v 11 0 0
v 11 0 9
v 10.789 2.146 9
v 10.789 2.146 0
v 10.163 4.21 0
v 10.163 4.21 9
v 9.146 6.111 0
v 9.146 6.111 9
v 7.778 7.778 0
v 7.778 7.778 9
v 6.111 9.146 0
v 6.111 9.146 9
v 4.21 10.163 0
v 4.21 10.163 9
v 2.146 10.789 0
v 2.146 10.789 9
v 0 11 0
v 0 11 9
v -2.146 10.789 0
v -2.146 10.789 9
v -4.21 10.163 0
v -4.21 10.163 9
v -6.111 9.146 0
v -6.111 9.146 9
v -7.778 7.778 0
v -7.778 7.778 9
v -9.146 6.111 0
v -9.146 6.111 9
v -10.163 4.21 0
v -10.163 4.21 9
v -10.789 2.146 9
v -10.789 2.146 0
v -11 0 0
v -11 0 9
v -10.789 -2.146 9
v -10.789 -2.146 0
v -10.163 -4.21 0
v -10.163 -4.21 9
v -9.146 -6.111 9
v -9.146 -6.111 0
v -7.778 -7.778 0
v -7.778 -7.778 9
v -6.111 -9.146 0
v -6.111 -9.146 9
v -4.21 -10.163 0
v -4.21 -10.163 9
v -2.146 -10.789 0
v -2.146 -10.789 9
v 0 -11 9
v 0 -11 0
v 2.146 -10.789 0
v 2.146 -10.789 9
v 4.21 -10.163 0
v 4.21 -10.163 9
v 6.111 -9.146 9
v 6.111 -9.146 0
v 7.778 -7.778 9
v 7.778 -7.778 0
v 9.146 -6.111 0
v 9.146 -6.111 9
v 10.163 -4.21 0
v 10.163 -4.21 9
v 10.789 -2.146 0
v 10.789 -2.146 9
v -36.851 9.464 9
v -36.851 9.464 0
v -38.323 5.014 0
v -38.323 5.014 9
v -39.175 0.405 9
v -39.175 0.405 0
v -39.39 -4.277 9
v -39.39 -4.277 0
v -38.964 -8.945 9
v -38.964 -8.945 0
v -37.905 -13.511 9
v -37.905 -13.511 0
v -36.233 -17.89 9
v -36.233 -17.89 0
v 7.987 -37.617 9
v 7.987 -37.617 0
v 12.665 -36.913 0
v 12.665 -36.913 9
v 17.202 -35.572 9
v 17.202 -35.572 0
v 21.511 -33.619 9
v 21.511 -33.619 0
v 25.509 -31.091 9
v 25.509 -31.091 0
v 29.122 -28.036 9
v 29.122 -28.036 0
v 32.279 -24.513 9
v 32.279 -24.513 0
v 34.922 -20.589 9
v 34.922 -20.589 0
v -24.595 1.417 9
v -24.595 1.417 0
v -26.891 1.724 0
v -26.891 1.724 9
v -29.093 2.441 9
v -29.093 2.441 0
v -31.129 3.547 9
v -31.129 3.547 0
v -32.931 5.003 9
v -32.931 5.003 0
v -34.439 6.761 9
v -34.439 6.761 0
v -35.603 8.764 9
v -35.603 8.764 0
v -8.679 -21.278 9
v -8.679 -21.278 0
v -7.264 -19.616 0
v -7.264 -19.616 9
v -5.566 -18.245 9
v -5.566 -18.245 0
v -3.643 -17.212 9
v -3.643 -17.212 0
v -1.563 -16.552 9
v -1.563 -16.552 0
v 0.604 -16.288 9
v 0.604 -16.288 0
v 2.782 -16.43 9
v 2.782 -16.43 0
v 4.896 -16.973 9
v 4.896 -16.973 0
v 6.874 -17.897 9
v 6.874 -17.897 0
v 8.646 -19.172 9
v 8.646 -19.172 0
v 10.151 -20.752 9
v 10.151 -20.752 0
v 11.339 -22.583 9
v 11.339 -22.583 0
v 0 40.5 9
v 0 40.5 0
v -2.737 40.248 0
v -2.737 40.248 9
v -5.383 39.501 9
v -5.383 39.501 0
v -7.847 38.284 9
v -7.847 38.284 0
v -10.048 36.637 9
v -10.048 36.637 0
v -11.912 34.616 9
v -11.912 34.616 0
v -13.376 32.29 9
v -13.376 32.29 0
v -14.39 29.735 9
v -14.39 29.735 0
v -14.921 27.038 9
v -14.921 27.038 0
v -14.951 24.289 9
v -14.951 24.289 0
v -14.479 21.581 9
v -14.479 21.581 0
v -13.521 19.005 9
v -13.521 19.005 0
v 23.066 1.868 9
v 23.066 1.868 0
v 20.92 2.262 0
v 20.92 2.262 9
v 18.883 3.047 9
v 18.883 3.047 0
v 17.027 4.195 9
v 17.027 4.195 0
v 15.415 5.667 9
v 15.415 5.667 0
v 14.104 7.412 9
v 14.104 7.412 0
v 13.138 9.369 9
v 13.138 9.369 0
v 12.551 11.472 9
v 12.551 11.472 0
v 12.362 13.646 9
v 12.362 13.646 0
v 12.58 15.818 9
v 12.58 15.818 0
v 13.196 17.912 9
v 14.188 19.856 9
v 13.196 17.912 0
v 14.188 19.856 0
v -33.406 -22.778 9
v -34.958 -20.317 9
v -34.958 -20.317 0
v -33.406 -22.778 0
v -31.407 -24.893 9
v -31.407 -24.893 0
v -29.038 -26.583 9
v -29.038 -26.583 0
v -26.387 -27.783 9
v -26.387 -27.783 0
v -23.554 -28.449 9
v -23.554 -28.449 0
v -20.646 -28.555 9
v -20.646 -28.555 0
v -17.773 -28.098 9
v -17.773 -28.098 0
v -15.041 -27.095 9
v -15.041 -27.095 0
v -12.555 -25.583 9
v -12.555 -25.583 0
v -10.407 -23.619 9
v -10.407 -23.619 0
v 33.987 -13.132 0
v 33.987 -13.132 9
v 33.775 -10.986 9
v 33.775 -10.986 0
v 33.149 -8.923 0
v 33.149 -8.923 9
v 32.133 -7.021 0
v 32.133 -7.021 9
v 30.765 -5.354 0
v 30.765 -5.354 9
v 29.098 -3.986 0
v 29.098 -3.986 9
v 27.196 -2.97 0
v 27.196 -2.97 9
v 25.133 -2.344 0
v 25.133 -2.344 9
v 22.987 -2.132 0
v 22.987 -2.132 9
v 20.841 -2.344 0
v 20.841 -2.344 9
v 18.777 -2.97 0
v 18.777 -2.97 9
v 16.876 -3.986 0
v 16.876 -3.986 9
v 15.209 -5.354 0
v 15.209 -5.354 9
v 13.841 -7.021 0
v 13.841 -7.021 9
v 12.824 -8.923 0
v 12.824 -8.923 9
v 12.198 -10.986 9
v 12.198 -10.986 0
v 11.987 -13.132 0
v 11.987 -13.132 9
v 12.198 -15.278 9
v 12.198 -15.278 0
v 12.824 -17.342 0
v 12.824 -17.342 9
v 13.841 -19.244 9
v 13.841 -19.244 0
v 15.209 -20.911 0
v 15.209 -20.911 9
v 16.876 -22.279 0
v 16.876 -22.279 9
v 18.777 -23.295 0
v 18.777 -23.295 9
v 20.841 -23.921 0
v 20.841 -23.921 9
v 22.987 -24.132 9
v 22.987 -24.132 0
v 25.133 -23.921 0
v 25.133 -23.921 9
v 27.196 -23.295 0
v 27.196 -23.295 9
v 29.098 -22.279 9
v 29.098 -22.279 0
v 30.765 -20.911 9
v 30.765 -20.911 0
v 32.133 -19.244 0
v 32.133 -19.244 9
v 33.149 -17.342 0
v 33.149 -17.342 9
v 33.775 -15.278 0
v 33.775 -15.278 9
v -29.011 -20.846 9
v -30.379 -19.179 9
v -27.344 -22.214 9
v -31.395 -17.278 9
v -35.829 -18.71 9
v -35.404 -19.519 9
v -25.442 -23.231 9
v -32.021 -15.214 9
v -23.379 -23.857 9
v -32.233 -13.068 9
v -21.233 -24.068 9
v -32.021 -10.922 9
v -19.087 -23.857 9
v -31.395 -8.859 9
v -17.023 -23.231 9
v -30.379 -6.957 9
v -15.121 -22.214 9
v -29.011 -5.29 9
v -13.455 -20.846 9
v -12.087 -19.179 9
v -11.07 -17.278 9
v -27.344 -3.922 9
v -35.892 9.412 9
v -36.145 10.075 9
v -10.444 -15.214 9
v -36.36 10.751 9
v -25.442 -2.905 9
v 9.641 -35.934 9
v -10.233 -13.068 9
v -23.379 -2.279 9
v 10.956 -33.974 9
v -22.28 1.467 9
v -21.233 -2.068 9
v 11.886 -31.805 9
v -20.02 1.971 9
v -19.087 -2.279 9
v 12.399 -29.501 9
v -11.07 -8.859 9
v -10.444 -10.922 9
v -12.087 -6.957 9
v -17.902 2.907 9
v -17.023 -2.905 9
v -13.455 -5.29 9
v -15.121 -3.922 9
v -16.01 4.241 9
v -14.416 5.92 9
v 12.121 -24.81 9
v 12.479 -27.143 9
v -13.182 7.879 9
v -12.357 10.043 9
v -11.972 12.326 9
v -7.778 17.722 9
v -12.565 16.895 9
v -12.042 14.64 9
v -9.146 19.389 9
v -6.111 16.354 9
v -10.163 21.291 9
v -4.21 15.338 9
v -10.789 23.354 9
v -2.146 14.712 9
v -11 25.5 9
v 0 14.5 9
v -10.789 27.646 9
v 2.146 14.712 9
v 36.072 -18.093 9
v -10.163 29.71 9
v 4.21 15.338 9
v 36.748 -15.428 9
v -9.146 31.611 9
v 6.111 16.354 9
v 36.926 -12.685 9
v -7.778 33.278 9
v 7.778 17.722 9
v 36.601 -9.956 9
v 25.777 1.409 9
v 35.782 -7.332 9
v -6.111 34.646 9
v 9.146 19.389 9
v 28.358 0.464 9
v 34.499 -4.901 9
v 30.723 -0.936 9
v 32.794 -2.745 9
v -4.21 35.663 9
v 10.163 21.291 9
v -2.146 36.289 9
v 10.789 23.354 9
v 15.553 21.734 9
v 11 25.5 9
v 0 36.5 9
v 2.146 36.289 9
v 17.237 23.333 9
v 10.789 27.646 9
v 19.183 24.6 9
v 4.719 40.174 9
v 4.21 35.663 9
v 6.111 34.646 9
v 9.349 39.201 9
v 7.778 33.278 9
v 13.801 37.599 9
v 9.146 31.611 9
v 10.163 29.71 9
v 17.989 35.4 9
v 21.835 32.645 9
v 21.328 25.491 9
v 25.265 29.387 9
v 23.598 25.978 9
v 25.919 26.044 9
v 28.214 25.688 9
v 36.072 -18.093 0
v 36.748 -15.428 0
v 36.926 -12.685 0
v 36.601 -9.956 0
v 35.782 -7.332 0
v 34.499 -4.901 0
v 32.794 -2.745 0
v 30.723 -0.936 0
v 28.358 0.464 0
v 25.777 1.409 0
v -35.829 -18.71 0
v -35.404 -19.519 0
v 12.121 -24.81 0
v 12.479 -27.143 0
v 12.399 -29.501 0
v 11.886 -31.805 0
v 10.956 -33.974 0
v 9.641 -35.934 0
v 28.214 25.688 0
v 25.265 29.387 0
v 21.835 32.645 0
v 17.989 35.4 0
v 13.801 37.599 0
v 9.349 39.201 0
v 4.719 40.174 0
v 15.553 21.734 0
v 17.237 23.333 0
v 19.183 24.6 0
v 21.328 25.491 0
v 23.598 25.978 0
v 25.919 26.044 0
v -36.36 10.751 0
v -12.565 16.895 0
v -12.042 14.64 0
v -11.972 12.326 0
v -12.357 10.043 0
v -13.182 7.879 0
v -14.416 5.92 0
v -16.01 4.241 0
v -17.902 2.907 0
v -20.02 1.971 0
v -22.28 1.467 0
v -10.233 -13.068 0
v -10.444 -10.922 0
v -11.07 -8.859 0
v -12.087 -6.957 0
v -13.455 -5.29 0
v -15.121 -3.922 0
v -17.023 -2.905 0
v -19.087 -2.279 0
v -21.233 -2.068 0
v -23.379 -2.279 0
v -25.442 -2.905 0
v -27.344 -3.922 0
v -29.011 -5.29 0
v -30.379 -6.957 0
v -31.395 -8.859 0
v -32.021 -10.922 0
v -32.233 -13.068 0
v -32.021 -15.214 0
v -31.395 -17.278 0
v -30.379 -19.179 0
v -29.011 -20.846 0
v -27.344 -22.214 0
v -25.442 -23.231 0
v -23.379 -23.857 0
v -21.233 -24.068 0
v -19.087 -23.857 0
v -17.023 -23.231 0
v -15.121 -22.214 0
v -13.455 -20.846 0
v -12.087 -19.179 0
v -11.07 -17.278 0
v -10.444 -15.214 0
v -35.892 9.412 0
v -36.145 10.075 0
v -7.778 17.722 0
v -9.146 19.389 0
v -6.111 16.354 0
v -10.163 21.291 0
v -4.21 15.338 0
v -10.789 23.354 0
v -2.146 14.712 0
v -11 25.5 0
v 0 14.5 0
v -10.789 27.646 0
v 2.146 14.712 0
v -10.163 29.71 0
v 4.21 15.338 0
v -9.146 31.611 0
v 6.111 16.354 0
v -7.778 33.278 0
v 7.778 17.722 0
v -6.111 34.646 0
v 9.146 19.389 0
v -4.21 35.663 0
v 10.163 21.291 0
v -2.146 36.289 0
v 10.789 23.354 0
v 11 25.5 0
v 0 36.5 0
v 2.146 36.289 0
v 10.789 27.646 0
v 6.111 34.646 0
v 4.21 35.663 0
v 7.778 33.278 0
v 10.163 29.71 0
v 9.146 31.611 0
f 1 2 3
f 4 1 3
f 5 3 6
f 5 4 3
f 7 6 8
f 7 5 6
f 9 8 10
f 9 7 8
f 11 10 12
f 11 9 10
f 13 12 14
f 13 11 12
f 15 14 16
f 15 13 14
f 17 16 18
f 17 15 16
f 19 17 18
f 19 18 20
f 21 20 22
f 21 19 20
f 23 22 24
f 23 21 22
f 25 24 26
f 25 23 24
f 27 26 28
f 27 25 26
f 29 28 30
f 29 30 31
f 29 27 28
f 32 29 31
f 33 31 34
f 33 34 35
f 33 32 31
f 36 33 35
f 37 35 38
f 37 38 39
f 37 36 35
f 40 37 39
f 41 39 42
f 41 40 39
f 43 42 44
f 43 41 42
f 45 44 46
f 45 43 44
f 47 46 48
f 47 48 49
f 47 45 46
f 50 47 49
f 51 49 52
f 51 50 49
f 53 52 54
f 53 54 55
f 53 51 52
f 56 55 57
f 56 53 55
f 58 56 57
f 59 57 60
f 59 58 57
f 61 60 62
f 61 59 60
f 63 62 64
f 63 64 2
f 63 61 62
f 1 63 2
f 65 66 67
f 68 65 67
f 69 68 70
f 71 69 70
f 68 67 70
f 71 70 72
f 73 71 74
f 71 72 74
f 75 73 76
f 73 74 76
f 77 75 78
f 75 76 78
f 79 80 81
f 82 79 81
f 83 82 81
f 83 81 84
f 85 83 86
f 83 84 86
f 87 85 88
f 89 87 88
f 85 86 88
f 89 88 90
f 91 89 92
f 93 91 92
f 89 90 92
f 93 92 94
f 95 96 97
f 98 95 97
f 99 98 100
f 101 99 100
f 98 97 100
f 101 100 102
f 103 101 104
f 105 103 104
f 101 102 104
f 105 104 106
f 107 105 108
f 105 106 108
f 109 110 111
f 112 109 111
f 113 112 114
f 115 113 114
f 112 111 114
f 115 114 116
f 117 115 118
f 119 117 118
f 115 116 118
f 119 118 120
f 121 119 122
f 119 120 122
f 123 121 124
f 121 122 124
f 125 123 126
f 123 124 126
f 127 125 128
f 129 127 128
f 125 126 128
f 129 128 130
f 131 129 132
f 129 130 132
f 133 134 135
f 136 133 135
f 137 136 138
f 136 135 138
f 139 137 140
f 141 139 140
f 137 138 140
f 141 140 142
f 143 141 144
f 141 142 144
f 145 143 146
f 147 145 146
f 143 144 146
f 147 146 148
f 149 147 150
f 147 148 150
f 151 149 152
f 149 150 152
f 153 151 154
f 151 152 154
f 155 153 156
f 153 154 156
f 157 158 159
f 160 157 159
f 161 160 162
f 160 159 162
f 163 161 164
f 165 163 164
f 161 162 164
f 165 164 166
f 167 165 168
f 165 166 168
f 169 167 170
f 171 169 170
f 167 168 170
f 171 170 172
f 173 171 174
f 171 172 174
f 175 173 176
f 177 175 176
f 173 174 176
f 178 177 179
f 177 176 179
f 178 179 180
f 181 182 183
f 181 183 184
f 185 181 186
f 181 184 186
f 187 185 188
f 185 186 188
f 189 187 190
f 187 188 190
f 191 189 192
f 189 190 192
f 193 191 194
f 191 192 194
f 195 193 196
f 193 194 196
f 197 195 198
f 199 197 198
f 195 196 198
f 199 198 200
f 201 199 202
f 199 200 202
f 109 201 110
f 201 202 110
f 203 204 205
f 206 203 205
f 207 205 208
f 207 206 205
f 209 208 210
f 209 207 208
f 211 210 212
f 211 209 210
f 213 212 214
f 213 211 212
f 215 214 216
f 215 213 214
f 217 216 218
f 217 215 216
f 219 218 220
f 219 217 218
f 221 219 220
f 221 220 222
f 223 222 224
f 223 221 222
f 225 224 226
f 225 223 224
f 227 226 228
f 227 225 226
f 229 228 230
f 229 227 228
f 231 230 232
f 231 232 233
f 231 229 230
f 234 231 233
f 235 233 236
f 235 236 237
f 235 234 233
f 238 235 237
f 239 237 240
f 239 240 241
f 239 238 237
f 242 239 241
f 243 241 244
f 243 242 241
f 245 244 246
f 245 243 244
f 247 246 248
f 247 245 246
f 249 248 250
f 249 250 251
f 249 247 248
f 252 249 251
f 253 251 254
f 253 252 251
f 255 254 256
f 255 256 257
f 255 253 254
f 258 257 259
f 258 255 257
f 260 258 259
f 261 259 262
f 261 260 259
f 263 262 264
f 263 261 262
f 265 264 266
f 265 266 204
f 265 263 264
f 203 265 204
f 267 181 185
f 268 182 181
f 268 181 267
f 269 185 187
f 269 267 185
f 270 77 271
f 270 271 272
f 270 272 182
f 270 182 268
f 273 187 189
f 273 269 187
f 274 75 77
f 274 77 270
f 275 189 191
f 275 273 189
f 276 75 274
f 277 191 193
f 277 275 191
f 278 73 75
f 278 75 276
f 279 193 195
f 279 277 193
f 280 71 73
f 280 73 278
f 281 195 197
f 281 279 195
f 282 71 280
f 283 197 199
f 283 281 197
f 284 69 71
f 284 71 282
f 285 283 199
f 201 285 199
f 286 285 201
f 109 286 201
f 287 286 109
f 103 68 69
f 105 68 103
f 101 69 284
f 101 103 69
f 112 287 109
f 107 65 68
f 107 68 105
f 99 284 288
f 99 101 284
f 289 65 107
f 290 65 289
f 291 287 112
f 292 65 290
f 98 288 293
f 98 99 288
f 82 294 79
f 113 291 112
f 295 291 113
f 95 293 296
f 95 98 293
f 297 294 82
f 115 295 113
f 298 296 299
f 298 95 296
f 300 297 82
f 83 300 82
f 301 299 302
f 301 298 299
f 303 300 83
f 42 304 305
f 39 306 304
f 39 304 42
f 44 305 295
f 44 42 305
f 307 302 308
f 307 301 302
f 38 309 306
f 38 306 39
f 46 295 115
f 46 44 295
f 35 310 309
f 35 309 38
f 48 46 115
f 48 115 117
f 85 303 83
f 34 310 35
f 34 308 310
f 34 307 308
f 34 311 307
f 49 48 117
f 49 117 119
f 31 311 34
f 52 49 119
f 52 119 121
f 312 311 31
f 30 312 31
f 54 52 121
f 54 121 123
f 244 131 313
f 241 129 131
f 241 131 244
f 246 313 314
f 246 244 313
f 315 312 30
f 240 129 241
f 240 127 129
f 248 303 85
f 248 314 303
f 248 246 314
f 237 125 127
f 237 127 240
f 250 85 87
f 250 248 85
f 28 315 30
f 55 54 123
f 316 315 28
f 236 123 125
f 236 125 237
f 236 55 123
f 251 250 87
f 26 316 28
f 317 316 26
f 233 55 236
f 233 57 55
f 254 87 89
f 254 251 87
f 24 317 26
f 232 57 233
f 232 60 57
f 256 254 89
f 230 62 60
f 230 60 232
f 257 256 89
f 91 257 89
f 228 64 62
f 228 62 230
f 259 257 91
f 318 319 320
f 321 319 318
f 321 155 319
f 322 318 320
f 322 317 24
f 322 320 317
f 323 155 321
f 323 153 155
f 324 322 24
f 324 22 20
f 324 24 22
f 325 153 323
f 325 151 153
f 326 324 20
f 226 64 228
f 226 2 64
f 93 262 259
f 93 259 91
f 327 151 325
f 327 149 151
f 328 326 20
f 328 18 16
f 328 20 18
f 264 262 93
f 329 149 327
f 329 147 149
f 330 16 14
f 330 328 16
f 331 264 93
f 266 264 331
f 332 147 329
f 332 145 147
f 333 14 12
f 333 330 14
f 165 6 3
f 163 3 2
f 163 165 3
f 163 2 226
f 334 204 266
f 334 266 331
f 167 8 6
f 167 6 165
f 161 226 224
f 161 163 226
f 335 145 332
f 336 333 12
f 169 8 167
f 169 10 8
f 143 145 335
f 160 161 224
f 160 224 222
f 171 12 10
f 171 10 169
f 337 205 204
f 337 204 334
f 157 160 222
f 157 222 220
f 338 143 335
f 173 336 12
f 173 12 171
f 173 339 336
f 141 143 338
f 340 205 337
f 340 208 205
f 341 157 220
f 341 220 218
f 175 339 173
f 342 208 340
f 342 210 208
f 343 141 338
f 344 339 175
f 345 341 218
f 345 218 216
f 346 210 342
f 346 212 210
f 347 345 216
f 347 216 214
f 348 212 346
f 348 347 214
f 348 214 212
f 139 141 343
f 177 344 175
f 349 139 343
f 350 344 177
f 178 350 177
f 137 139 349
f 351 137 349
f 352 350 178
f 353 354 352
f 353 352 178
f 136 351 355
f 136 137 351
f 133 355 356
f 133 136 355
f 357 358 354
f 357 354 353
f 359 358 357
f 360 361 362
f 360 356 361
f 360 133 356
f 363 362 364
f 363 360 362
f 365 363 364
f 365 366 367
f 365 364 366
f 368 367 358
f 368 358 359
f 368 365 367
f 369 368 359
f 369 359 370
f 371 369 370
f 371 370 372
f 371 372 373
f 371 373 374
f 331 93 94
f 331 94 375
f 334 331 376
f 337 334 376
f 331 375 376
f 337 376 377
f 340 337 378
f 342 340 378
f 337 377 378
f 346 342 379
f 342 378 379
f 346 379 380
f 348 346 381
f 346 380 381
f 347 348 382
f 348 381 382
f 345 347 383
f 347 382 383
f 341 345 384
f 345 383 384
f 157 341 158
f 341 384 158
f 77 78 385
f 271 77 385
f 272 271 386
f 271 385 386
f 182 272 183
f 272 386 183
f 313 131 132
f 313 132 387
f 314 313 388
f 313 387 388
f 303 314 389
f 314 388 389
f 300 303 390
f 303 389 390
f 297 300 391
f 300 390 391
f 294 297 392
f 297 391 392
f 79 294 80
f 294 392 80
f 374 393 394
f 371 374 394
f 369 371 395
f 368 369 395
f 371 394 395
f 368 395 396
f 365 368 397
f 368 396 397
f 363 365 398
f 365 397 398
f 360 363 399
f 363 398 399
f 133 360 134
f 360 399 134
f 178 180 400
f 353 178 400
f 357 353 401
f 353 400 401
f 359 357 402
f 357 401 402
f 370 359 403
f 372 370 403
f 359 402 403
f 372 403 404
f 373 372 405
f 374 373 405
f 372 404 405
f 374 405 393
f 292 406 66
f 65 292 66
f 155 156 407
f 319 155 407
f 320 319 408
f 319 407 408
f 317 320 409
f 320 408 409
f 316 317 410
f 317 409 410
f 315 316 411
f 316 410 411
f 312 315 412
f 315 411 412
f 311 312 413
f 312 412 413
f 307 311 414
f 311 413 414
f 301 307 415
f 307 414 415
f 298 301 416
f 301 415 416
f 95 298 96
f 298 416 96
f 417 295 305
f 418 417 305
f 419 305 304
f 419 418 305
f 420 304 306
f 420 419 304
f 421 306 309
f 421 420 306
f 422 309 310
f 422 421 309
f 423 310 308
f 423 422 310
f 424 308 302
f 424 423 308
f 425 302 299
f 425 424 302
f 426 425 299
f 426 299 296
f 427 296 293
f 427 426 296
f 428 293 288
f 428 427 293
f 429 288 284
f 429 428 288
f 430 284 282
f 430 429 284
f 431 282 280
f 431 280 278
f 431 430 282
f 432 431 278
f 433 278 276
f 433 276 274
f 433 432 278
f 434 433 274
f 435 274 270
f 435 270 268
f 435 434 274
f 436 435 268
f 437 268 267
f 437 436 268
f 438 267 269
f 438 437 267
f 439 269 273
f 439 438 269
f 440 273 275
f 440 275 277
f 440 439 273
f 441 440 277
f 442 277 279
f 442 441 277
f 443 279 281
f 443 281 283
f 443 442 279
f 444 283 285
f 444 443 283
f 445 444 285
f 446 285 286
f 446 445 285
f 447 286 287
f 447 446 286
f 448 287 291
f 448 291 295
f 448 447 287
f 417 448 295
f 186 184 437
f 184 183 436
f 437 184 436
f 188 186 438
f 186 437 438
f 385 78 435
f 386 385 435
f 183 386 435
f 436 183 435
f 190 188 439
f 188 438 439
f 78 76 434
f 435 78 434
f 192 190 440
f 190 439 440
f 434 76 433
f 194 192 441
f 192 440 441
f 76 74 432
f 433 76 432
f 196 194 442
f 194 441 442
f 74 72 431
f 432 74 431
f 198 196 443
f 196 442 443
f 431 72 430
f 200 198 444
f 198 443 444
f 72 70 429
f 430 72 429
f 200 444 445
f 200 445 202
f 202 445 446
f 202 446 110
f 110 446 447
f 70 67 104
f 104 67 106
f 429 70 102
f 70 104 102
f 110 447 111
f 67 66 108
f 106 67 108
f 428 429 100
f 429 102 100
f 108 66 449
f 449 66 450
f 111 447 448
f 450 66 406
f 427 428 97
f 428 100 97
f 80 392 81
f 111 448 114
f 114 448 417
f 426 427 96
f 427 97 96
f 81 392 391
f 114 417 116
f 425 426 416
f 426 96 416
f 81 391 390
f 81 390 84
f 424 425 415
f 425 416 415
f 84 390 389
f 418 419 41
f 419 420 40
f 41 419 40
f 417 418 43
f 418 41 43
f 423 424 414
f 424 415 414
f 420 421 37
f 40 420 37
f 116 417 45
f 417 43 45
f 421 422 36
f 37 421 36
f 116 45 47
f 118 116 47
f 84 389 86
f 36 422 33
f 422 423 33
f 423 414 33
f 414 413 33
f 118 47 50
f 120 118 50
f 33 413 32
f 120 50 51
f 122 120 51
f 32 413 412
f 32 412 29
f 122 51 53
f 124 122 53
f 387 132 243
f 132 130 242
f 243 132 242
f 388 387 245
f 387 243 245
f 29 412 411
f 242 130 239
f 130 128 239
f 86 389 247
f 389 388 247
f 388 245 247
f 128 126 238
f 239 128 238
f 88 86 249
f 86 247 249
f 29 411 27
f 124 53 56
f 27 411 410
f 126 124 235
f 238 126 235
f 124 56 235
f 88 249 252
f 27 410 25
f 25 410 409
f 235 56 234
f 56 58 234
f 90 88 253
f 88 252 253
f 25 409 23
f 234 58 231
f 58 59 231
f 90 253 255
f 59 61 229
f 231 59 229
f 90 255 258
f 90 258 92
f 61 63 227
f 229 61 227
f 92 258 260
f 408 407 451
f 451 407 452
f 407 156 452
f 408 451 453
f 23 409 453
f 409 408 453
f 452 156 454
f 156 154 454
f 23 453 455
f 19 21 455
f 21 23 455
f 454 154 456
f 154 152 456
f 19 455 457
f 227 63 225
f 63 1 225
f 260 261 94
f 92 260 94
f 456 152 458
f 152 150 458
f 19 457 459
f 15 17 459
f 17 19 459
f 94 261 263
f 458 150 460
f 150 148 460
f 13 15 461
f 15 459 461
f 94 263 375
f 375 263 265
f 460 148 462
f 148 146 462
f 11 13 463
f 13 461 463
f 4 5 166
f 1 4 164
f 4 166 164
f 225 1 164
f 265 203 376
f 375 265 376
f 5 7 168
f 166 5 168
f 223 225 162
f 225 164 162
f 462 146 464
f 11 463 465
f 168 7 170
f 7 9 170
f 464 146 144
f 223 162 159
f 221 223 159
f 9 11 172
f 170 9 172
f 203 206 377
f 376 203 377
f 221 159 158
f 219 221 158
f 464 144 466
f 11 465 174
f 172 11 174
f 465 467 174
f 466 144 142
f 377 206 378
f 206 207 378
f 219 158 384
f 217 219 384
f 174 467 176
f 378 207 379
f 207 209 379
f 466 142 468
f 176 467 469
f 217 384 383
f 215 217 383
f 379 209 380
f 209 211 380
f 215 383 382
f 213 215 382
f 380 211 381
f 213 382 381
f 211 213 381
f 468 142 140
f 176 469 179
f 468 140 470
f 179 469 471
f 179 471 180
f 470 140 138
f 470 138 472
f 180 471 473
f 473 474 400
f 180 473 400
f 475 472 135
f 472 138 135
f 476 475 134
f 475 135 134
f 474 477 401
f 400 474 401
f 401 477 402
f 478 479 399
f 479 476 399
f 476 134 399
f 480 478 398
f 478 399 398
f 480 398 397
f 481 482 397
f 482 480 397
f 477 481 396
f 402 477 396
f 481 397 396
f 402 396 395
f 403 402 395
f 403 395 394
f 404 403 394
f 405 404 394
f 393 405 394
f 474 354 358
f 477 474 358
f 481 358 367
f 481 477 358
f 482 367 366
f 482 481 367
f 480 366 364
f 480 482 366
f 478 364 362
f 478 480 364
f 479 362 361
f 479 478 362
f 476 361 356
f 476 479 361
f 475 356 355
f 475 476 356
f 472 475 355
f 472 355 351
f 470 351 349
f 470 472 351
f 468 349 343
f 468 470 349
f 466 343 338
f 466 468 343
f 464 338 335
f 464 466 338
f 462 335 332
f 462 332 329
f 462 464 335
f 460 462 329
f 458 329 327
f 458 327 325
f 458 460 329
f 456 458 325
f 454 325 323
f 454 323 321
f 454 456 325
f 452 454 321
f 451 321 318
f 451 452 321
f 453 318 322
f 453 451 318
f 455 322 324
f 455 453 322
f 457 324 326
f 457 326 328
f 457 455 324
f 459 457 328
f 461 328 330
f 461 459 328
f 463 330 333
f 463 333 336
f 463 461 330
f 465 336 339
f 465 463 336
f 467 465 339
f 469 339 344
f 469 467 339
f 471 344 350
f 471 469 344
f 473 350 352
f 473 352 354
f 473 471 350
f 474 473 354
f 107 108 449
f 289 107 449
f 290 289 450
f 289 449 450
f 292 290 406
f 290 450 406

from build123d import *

# Parameters (mm, degrees)
F0_R     = 11
F1_DEPTH = 9


with BuildPart() as f1:
    # F0 (on Top) → F1 (new body)
    with BuildSketch(Plane.XY):
        with BuildLine():
            ThreePointArc((-36.851079, 9.464021), (-39.389584, -4.277113), (-36.232757, -17.889505))
            ThreePointArc((-36.232757, -17.889505), (-35.619676, -19.115828), (-34.958043, -20.316652))
            ThreePointArc((-34.958043, -20.316652), (-22.102923, -28.572601), (-8.67895, -21.277965))
            ThreePointArc((-8.67895, -21.277965), (1.696424, -16.308632), (11.338573, -22.583312))
            ThreePointArc((11.338573, -22.583312), (12.196181, -30.664961), (7.987033, -37.617055))
            ThreePointArc((7.987033, -37.617055), (23.55354, -32.423652), (34.921925, -20.58949))
            ThreePointArc((34.921925, -20.58949), (35.19653, -6.086622), (23.066393, 1.867519))
            ThreePointArc((23.066393, 1.867519), (13.575138, 8.36819), (14.188096, 19.855876))
            ThreePointArc((14.188096, 19.855876), (20.235163, 25.094459), (28.21375, 25.687702))
            ThreePointArc((28.21375, 25.687702), (15.932878, 36.571991), (0, 40.50022))
            ThreePointArc((0, 40.50022), (-12.697154, 33.486601), (-13.520574, 19.004523))
            ThreePointArc((-13.520574, 19.004523), (-13.750641, 6.869394), (-24.594523, 1.417373))
            ThreePointArc((-24.594523, 1.417373), (-31.129245, 3.546576), (-35.603177, 8.763859))
            ThreePointArc((-35.603177, 8.763859), (-36.022944, 9.741554), (-36.359555, 10.750902))
            Line((-36.359555, 10.750902), (-36.851079, 9.464021))
        make_face()
        with Locations((-21.232757, -13.068097)):
            Circle(F0_R, mode=Mode.SUBTRACT)
        Circle(F0_R, mode=Mode.SUBTRACT)
        with Locations((22.986825, -13.132481)):
            Circle(F0_R, mode=Mode.SUBTRACT)
        with Locations((0, 25.50022)):
            Circle(F0_R, mode=Mode.SUBTRACT)
    extrude(amount=F1_DEPTH)


solid = f1.part
